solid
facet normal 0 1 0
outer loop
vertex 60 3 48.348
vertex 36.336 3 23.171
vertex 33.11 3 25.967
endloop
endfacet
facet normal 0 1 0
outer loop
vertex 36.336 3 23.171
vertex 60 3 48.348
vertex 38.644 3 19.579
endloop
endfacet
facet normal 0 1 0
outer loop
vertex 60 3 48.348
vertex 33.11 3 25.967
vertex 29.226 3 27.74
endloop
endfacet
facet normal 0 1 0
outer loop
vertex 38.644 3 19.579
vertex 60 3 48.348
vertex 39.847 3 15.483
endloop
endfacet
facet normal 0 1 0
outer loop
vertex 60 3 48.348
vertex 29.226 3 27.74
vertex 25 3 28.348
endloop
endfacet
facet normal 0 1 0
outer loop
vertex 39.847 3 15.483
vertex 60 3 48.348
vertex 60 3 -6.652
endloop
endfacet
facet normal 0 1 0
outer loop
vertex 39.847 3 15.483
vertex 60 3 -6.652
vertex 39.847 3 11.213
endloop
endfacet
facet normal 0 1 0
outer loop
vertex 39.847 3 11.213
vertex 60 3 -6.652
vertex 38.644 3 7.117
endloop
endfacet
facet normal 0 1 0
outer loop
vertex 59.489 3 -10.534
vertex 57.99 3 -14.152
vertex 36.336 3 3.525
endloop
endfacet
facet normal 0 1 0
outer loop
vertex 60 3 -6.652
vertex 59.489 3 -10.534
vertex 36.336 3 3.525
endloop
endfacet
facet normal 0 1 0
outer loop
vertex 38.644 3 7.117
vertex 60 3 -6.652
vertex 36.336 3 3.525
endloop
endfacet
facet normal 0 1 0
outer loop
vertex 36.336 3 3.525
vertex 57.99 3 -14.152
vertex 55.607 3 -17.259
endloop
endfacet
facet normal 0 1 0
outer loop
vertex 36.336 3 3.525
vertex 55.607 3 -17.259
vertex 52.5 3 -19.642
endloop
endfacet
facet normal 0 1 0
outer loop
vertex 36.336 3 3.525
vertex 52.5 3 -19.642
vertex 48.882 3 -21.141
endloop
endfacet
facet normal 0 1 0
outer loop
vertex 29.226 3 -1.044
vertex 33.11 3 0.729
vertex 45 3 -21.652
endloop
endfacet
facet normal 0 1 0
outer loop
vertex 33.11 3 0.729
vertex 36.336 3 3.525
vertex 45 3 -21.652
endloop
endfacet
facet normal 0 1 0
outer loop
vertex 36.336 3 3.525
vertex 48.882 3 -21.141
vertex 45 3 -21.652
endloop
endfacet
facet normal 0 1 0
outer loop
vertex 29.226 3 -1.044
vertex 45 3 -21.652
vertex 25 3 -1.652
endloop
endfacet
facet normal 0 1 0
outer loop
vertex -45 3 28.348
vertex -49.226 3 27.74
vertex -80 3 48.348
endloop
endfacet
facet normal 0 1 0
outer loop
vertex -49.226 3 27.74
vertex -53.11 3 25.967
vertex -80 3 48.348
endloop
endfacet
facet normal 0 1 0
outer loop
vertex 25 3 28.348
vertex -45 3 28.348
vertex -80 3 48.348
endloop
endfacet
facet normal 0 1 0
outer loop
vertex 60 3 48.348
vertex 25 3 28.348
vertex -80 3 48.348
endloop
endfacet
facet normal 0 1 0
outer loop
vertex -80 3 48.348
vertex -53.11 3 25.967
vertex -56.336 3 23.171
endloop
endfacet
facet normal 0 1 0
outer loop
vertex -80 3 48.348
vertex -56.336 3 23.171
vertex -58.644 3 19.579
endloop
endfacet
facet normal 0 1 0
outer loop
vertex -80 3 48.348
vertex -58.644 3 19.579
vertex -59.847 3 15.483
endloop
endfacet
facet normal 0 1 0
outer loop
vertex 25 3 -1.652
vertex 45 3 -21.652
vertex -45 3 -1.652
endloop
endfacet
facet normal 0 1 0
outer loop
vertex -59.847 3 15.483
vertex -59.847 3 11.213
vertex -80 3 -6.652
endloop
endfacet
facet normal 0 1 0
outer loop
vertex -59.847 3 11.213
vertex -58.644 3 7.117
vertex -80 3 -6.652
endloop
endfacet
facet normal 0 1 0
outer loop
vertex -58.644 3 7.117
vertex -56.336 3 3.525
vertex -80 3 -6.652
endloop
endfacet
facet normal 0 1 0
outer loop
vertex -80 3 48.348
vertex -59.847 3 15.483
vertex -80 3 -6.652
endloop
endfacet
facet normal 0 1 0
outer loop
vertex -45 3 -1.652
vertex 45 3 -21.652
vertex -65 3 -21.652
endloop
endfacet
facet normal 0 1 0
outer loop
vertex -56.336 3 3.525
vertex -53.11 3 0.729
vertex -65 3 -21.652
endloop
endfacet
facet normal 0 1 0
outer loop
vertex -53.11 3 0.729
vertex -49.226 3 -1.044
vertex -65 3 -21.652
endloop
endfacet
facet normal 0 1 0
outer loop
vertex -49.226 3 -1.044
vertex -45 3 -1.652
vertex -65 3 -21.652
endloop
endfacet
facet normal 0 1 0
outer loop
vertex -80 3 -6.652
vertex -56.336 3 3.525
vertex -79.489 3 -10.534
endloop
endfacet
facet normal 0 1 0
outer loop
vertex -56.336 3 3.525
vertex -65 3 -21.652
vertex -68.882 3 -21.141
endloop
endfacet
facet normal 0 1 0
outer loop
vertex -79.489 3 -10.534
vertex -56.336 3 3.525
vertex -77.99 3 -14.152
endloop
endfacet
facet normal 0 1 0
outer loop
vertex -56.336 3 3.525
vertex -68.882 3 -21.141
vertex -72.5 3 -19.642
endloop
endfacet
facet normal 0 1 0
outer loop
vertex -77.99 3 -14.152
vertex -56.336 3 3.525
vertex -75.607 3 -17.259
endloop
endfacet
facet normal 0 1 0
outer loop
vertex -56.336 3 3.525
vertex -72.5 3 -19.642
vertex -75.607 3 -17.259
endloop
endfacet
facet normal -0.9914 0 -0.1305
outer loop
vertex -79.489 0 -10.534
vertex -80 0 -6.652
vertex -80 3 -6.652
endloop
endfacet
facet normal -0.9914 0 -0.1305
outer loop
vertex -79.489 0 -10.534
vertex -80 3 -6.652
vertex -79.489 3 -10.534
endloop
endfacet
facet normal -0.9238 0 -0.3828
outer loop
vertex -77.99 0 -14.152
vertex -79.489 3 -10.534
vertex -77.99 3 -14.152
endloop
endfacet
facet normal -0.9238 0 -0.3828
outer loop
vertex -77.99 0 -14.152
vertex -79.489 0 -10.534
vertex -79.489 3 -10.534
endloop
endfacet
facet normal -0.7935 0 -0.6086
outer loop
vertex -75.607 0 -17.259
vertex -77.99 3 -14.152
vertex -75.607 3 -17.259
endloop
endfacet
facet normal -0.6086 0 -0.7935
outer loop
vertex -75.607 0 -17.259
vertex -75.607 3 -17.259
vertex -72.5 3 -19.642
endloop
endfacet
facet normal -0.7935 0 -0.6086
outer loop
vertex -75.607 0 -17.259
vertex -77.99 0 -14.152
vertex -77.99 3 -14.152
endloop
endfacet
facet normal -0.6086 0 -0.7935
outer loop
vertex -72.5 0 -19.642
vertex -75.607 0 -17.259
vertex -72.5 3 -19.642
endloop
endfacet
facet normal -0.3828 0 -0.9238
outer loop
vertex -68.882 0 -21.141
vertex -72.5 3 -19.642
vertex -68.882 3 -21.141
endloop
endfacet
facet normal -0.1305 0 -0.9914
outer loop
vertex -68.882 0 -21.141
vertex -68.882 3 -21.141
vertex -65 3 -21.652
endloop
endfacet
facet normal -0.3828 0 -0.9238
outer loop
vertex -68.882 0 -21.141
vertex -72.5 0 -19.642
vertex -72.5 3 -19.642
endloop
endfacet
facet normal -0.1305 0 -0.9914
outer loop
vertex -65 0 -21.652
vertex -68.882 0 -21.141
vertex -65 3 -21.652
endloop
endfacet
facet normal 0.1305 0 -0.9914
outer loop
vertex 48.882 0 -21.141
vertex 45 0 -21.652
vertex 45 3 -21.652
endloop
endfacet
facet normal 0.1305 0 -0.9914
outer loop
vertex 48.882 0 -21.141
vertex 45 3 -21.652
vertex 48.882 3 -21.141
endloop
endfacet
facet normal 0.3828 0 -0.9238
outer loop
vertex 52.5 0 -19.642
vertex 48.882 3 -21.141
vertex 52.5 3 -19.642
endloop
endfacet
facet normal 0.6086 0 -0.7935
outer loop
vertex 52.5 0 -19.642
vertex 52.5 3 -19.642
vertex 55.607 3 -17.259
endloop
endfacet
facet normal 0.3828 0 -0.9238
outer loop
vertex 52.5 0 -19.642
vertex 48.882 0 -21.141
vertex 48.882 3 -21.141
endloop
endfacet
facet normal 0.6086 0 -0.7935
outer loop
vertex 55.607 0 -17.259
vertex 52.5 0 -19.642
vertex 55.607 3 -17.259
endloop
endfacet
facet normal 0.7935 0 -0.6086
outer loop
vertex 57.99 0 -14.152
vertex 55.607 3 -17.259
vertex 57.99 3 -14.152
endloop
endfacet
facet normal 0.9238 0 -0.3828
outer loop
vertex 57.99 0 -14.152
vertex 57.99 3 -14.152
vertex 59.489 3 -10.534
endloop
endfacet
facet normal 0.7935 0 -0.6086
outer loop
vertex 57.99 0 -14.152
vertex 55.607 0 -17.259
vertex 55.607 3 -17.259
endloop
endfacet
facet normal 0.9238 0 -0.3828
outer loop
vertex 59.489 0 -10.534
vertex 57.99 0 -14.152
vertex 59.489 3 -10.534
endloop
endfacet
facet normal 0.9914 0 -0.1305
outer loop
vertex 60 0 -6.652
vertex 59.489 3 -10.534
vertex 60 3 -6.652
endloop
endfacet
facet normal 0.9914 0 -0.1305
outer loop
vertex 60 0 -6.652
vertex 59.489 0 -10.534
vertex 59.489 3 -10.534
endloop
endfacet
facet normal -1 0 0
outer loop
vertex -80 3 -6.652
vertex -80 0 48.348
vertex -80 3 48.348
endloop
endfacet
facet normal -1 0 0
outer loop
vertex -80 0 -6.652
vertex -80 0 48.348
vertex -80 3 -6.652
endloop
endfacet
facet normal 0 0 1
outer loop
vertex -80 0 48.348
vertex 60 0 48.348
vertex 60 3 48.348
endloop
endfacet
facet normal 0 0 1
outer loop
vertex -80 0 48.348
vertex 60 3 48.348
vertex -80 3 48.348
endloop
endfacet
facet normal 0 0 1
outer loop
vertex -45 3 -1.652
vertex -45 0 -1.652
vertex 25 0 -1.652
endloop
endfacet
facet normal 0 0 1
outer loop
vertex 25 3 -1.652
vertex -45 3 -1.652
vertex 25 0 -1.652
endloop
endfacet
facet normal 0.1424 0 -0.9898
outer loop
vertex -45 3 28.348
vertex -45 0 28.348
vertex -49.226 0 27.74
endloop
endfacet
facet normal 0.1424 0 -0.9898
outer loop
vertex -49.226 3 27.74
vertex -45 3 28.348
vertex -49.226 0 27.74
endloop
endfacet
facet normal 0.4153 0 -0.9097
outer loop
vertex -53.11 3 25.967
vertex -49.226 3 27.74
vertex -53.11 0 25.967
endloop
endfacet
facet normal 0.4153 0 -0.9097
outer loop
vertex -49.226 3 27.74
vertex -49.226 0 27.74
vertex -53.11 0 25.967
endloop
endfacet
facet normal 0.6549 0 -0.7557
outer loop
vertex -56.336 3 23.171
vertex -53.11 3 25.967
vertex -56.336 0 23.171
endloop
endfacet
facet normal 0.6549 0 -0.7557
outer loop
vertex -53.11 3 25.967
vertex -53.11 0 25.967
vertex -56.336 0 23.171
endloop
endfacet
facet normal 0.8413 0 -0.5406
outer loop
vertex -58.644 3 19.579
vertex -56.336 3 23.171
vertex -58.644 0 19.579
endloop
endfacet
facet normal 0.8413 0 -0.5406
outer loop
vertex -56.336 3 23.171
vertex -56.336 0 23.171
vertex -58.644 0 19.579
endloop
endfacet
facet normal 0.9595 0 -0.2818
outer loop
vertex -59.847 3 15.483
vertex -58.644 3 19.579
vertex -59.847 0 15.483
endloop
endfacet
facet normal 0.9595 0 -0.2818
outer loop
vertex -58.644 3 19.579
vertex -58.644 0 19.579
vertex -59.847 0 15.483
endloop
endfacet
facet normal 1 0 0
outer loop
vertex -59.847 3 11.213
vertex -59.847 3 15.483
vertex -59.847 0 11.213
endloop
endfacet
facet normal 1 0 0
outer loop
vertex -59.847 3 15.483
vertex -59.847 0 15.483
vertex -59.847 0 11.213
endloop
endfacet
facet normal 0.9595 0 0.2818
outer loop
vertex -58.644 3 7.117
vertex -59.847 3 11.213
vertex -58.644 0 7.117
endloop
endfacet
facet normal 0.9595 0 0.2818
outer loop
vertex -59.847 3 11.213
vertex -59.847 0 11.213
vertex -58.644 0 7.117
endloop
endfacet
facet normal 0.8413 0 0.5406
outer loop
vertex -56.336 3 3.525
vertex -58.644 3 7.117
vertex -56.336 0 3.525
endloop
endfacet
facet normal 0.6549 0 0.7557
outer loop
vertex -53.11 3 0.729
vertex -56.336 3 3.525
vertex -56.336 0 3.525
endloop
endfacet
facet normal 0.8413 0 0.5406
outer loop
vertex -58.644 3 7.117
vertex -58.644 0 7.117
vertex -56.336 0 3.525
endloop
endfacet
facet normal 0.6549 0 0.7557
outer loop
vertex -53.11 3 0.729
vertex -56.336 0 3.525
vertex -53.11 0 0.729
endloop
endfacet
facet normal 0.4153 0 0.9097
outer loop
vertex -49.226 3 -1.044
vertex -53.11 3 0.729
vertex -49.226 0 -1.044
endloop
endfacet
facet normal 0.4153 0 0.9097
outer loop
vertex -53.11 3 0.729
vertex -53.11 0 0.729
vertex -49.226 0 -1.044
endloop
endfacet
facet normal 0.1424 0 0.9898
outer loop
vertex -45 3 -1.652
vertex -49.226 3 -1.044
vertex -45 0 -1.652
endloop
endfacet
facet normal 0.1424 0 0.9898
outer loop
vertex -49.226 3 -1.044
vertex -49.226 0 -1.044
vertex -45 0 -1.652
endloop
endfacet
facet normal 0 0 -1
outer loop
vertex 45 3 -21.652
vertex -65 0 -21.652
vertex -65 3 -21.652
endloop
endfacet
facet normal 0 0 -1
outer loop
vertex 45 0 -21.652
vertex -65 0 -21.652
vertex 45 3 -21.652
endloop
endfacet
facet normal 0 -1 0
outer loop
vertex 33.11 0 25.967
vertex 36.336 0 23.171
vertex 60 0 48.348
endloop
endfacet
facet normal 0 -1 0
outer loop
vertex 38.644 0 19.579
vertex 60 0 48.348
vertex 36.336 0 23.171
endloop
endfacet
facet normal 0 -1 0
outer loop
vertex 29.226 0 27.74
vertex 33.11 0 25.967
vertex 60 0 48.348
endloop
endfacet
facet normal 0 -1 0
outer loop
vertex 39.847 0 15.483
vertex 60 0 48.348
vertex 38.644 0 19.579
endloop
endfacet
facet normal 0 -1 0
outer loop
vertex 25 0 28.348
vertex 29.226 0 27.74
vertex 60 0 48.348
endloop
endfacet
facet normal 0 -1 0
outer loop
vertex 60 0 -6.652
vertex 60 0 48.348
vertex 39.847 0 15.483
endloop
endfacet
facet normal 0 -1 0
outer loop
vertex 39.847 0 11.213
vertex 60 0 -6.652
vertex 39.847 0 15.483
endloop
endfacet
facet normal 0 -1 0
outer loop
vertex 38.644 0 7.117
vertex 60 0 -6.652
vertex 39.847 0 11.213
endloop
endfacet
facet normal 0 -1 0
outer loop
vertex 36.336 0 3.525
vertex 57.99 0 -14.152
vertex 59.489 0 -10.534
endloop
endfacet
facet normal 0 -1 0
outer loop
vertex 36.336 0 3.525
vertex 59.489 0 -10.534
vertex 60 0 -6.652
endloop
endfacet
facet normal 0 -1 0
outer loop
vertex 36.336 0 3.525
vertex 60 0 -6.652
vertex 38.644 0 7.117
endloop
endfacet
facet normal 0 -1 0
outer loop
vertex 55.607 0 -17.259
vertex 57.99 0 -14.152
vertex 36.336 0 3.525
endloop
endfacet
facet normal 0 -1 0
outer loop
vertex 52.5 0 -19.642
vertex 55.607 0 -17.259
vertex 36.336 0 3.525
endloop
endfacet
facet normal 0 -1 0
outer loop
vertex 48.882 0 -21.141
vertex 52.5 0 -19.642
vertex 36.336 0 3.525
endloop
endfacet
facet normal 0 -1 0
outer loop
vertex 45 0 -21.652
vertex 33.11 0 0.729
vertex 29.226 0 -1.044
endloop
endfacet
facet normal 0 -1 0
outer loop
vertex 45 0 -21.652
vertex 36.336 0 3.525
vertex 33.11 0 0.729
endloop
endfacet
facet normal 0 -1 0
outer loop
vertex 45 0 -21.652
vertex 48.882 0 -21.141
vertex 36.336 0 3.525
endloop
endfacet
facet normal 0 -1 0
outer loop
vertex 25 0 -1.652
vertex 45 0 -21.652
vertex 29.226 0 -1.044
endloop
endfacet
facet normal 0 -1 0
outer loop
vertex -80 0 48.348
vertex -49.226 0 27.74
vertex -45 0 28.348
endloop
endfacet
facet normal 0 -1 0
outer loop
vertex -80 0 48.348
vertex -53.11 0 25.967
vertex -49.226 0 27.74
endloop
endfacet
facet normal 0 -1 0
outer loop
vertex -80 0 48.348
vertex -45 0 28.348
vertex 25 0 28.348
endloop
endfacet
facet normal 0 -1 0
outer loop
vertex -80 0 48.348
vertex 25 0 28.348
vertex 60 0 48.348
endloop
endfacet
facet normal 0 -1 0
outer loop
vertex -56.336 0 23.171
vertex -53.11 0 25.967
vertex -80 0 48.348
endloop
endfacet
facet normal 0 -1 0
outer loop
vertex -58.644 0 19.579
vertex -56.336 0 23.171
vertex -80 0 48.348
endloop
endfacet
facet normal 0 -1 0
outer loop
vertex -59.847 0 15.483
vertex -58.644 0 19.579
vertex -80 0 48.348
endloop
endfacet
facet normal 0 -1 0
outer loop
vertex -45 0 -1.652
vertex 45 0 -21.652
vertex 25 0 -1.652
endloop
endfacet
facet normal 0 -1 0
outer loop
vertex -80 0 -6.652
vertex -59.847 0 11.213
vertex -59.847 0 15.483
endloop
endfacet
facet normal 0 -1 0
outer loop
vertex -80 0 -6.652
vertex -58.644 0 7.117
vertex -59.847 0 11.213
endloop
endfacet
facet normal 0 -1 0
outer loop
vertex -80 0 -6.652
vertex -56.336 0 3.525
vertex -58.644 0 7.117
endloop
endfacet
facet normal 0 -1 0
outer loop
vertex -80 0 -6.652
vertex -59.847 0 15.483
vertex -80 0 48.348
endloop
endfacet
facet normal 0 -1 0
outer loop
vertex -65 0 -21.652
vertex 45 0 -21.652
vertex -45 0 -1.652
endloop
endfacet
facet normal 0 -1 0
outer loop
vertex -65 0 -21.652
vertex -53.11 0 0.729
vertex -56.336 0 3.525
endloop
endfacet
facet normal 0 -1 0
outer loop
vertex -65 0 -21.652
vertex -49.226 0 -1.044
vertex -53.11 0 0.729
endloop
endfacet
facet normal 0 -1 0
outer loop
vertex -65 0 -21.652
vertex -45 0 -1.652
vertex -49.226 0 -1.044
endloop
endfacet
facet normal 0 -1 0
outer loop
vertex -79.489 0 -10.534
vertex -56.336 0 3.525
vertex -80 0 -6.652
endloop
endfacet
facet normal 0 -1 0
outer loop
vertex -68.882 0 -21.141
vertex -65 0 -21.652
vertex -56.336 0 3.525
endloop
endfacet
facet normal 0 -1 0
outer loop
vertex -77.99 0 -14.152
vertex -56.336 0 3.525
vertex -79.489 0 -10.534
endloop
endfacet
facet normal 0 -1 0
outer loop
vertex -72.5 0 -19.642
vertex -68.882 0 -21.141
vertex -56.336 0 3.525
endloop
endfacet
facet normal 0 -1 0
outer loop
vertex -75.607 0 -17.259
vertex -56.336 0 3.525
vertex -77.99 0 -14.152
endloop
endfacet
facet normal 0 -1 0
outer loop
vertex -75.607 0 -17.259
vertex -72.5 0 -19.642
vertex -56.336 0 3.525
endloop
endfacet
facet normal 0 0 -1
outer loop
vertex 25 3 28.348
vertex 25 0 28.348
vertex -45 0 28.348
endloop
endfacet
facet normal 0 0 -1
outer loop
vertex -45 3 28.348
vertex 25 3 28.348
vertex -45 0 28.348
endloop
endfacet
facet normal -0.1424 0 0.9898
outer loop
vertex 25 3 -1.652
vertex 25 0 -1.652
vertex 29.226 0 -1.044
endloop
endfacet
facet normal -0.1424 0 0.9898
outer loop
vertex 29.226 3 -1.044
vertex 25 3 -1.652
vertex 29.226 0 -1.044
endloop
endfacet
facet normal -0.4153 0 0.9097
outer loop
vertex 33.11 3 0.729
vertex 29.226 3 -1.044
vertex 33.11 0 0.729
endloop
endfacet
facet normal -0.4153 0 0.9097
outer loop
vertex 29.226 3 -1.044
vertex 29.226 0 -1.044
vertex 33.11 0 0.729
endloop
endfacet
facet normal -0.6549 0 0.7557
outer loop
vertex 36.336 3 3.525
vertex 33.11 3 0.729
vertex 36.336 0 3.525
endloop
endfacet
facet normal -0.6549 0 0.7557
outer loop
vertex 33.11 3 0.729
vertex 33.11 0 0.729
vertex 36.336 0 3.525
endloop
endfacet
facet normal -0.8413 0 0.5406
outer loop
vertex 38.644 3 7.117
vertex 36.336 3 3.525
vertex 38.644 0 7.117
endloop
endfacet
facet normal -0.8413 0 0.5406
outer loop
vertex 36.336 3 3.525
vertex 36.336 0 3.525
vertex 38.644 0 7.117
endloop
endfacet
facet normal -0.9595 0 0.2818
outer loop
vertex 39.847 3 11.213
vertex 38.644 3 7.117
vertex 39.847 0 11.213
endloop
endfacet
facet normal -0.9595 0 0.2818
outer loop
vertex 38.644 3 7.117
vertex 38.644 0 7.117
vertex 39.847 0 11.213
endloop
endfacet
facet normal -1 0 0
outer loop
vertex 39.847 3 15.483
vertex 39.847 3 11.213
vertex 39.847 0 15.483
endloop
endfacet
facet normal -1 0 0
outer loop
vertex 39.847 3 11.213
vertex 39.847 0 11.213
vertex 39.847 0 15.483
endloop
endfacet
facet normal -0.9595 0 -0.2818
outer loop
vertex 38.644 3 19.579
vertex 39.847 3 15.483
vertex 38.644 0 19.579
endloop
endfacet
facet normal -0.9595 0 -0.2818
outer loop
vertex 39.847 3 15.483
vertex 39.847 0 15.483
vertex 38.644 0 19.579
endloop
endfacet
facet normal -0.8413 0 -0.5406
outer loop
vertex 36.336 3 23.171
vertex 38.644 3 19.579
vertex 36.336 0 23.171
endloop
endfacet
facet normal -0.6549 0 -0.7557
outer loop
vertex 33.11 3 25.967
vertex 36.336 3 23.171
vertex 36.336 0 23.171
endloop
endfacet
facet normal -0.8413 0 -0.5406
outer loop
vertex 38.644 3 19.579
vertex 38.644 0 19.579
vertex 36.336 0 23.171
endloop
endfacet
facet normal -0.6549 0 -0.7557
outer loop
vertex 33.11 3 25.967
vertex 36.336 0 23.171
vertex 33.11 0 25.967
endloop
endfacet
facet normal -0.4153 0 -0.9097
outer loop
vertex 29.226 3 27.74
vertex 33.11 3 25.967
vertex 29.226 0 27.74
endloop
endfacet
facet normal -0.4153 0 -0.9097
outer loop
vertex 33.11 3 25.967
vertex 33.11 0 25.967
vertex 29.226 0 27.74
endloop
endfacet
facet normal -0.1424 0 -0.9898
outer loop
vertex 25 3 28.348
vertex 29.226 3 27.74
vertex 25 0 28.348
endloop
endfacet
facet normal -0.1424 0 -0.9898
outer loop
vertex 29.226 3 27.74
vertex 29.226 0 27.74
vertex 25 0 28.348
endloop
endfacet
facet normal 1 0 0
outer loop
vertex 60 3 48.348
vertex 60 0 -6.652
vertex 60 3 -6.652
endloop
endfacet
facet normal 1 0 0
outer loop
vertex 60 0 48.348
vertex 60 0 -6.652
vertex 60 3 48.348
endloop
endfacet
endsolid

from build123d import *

# Parameters (mm, degrees)
BOSS_EXTRU_1_DEPTH = 3


with BuildPart() as part:
    # Esquisse3 → Boss.-Extru.1 (new body)
    with BuildSketch(Plane(origin=(0, 0, 0), x_dir=(1, 0, 0), z_dir=(0, 1, 0))):
        with BuildLine():
            Line((-65, 21.652023134), (45, 21.652023134))
            ThreePointArc((45, 21.652023134), (55.606601718, 17.258624852), (60, 6.652023134))
            Line((60, 6.652023134), (60, -48.347976866))
            Line((60, -48.347976866), (-80, -48.347976866))
            Line((-80, -48.347976866), (-80, 6.652023134))
            ThreePointArc((-80, 6.652023134), (-75.606601718, 17.258624852), (-65, 21.652023134))
        make_face()
        with BuildLine():
            Line((-45, 1.652023134), (25, 1.652023134))
            ThreePointArc((25, 1.652023134), (40, -13.347976866), (25, -28.347976866))
            Line((25, -28.347976866), (-45, -28.347976866))
            ThreePointArc((-45, -28.347976866), (-60, -13.347976866), (-45, 1.652023134))
        make_face(mode=Mode.SUBTRACT)
    extrude(amount=BOSS_EXTRU_1_DEPTH)


solid = part.part
